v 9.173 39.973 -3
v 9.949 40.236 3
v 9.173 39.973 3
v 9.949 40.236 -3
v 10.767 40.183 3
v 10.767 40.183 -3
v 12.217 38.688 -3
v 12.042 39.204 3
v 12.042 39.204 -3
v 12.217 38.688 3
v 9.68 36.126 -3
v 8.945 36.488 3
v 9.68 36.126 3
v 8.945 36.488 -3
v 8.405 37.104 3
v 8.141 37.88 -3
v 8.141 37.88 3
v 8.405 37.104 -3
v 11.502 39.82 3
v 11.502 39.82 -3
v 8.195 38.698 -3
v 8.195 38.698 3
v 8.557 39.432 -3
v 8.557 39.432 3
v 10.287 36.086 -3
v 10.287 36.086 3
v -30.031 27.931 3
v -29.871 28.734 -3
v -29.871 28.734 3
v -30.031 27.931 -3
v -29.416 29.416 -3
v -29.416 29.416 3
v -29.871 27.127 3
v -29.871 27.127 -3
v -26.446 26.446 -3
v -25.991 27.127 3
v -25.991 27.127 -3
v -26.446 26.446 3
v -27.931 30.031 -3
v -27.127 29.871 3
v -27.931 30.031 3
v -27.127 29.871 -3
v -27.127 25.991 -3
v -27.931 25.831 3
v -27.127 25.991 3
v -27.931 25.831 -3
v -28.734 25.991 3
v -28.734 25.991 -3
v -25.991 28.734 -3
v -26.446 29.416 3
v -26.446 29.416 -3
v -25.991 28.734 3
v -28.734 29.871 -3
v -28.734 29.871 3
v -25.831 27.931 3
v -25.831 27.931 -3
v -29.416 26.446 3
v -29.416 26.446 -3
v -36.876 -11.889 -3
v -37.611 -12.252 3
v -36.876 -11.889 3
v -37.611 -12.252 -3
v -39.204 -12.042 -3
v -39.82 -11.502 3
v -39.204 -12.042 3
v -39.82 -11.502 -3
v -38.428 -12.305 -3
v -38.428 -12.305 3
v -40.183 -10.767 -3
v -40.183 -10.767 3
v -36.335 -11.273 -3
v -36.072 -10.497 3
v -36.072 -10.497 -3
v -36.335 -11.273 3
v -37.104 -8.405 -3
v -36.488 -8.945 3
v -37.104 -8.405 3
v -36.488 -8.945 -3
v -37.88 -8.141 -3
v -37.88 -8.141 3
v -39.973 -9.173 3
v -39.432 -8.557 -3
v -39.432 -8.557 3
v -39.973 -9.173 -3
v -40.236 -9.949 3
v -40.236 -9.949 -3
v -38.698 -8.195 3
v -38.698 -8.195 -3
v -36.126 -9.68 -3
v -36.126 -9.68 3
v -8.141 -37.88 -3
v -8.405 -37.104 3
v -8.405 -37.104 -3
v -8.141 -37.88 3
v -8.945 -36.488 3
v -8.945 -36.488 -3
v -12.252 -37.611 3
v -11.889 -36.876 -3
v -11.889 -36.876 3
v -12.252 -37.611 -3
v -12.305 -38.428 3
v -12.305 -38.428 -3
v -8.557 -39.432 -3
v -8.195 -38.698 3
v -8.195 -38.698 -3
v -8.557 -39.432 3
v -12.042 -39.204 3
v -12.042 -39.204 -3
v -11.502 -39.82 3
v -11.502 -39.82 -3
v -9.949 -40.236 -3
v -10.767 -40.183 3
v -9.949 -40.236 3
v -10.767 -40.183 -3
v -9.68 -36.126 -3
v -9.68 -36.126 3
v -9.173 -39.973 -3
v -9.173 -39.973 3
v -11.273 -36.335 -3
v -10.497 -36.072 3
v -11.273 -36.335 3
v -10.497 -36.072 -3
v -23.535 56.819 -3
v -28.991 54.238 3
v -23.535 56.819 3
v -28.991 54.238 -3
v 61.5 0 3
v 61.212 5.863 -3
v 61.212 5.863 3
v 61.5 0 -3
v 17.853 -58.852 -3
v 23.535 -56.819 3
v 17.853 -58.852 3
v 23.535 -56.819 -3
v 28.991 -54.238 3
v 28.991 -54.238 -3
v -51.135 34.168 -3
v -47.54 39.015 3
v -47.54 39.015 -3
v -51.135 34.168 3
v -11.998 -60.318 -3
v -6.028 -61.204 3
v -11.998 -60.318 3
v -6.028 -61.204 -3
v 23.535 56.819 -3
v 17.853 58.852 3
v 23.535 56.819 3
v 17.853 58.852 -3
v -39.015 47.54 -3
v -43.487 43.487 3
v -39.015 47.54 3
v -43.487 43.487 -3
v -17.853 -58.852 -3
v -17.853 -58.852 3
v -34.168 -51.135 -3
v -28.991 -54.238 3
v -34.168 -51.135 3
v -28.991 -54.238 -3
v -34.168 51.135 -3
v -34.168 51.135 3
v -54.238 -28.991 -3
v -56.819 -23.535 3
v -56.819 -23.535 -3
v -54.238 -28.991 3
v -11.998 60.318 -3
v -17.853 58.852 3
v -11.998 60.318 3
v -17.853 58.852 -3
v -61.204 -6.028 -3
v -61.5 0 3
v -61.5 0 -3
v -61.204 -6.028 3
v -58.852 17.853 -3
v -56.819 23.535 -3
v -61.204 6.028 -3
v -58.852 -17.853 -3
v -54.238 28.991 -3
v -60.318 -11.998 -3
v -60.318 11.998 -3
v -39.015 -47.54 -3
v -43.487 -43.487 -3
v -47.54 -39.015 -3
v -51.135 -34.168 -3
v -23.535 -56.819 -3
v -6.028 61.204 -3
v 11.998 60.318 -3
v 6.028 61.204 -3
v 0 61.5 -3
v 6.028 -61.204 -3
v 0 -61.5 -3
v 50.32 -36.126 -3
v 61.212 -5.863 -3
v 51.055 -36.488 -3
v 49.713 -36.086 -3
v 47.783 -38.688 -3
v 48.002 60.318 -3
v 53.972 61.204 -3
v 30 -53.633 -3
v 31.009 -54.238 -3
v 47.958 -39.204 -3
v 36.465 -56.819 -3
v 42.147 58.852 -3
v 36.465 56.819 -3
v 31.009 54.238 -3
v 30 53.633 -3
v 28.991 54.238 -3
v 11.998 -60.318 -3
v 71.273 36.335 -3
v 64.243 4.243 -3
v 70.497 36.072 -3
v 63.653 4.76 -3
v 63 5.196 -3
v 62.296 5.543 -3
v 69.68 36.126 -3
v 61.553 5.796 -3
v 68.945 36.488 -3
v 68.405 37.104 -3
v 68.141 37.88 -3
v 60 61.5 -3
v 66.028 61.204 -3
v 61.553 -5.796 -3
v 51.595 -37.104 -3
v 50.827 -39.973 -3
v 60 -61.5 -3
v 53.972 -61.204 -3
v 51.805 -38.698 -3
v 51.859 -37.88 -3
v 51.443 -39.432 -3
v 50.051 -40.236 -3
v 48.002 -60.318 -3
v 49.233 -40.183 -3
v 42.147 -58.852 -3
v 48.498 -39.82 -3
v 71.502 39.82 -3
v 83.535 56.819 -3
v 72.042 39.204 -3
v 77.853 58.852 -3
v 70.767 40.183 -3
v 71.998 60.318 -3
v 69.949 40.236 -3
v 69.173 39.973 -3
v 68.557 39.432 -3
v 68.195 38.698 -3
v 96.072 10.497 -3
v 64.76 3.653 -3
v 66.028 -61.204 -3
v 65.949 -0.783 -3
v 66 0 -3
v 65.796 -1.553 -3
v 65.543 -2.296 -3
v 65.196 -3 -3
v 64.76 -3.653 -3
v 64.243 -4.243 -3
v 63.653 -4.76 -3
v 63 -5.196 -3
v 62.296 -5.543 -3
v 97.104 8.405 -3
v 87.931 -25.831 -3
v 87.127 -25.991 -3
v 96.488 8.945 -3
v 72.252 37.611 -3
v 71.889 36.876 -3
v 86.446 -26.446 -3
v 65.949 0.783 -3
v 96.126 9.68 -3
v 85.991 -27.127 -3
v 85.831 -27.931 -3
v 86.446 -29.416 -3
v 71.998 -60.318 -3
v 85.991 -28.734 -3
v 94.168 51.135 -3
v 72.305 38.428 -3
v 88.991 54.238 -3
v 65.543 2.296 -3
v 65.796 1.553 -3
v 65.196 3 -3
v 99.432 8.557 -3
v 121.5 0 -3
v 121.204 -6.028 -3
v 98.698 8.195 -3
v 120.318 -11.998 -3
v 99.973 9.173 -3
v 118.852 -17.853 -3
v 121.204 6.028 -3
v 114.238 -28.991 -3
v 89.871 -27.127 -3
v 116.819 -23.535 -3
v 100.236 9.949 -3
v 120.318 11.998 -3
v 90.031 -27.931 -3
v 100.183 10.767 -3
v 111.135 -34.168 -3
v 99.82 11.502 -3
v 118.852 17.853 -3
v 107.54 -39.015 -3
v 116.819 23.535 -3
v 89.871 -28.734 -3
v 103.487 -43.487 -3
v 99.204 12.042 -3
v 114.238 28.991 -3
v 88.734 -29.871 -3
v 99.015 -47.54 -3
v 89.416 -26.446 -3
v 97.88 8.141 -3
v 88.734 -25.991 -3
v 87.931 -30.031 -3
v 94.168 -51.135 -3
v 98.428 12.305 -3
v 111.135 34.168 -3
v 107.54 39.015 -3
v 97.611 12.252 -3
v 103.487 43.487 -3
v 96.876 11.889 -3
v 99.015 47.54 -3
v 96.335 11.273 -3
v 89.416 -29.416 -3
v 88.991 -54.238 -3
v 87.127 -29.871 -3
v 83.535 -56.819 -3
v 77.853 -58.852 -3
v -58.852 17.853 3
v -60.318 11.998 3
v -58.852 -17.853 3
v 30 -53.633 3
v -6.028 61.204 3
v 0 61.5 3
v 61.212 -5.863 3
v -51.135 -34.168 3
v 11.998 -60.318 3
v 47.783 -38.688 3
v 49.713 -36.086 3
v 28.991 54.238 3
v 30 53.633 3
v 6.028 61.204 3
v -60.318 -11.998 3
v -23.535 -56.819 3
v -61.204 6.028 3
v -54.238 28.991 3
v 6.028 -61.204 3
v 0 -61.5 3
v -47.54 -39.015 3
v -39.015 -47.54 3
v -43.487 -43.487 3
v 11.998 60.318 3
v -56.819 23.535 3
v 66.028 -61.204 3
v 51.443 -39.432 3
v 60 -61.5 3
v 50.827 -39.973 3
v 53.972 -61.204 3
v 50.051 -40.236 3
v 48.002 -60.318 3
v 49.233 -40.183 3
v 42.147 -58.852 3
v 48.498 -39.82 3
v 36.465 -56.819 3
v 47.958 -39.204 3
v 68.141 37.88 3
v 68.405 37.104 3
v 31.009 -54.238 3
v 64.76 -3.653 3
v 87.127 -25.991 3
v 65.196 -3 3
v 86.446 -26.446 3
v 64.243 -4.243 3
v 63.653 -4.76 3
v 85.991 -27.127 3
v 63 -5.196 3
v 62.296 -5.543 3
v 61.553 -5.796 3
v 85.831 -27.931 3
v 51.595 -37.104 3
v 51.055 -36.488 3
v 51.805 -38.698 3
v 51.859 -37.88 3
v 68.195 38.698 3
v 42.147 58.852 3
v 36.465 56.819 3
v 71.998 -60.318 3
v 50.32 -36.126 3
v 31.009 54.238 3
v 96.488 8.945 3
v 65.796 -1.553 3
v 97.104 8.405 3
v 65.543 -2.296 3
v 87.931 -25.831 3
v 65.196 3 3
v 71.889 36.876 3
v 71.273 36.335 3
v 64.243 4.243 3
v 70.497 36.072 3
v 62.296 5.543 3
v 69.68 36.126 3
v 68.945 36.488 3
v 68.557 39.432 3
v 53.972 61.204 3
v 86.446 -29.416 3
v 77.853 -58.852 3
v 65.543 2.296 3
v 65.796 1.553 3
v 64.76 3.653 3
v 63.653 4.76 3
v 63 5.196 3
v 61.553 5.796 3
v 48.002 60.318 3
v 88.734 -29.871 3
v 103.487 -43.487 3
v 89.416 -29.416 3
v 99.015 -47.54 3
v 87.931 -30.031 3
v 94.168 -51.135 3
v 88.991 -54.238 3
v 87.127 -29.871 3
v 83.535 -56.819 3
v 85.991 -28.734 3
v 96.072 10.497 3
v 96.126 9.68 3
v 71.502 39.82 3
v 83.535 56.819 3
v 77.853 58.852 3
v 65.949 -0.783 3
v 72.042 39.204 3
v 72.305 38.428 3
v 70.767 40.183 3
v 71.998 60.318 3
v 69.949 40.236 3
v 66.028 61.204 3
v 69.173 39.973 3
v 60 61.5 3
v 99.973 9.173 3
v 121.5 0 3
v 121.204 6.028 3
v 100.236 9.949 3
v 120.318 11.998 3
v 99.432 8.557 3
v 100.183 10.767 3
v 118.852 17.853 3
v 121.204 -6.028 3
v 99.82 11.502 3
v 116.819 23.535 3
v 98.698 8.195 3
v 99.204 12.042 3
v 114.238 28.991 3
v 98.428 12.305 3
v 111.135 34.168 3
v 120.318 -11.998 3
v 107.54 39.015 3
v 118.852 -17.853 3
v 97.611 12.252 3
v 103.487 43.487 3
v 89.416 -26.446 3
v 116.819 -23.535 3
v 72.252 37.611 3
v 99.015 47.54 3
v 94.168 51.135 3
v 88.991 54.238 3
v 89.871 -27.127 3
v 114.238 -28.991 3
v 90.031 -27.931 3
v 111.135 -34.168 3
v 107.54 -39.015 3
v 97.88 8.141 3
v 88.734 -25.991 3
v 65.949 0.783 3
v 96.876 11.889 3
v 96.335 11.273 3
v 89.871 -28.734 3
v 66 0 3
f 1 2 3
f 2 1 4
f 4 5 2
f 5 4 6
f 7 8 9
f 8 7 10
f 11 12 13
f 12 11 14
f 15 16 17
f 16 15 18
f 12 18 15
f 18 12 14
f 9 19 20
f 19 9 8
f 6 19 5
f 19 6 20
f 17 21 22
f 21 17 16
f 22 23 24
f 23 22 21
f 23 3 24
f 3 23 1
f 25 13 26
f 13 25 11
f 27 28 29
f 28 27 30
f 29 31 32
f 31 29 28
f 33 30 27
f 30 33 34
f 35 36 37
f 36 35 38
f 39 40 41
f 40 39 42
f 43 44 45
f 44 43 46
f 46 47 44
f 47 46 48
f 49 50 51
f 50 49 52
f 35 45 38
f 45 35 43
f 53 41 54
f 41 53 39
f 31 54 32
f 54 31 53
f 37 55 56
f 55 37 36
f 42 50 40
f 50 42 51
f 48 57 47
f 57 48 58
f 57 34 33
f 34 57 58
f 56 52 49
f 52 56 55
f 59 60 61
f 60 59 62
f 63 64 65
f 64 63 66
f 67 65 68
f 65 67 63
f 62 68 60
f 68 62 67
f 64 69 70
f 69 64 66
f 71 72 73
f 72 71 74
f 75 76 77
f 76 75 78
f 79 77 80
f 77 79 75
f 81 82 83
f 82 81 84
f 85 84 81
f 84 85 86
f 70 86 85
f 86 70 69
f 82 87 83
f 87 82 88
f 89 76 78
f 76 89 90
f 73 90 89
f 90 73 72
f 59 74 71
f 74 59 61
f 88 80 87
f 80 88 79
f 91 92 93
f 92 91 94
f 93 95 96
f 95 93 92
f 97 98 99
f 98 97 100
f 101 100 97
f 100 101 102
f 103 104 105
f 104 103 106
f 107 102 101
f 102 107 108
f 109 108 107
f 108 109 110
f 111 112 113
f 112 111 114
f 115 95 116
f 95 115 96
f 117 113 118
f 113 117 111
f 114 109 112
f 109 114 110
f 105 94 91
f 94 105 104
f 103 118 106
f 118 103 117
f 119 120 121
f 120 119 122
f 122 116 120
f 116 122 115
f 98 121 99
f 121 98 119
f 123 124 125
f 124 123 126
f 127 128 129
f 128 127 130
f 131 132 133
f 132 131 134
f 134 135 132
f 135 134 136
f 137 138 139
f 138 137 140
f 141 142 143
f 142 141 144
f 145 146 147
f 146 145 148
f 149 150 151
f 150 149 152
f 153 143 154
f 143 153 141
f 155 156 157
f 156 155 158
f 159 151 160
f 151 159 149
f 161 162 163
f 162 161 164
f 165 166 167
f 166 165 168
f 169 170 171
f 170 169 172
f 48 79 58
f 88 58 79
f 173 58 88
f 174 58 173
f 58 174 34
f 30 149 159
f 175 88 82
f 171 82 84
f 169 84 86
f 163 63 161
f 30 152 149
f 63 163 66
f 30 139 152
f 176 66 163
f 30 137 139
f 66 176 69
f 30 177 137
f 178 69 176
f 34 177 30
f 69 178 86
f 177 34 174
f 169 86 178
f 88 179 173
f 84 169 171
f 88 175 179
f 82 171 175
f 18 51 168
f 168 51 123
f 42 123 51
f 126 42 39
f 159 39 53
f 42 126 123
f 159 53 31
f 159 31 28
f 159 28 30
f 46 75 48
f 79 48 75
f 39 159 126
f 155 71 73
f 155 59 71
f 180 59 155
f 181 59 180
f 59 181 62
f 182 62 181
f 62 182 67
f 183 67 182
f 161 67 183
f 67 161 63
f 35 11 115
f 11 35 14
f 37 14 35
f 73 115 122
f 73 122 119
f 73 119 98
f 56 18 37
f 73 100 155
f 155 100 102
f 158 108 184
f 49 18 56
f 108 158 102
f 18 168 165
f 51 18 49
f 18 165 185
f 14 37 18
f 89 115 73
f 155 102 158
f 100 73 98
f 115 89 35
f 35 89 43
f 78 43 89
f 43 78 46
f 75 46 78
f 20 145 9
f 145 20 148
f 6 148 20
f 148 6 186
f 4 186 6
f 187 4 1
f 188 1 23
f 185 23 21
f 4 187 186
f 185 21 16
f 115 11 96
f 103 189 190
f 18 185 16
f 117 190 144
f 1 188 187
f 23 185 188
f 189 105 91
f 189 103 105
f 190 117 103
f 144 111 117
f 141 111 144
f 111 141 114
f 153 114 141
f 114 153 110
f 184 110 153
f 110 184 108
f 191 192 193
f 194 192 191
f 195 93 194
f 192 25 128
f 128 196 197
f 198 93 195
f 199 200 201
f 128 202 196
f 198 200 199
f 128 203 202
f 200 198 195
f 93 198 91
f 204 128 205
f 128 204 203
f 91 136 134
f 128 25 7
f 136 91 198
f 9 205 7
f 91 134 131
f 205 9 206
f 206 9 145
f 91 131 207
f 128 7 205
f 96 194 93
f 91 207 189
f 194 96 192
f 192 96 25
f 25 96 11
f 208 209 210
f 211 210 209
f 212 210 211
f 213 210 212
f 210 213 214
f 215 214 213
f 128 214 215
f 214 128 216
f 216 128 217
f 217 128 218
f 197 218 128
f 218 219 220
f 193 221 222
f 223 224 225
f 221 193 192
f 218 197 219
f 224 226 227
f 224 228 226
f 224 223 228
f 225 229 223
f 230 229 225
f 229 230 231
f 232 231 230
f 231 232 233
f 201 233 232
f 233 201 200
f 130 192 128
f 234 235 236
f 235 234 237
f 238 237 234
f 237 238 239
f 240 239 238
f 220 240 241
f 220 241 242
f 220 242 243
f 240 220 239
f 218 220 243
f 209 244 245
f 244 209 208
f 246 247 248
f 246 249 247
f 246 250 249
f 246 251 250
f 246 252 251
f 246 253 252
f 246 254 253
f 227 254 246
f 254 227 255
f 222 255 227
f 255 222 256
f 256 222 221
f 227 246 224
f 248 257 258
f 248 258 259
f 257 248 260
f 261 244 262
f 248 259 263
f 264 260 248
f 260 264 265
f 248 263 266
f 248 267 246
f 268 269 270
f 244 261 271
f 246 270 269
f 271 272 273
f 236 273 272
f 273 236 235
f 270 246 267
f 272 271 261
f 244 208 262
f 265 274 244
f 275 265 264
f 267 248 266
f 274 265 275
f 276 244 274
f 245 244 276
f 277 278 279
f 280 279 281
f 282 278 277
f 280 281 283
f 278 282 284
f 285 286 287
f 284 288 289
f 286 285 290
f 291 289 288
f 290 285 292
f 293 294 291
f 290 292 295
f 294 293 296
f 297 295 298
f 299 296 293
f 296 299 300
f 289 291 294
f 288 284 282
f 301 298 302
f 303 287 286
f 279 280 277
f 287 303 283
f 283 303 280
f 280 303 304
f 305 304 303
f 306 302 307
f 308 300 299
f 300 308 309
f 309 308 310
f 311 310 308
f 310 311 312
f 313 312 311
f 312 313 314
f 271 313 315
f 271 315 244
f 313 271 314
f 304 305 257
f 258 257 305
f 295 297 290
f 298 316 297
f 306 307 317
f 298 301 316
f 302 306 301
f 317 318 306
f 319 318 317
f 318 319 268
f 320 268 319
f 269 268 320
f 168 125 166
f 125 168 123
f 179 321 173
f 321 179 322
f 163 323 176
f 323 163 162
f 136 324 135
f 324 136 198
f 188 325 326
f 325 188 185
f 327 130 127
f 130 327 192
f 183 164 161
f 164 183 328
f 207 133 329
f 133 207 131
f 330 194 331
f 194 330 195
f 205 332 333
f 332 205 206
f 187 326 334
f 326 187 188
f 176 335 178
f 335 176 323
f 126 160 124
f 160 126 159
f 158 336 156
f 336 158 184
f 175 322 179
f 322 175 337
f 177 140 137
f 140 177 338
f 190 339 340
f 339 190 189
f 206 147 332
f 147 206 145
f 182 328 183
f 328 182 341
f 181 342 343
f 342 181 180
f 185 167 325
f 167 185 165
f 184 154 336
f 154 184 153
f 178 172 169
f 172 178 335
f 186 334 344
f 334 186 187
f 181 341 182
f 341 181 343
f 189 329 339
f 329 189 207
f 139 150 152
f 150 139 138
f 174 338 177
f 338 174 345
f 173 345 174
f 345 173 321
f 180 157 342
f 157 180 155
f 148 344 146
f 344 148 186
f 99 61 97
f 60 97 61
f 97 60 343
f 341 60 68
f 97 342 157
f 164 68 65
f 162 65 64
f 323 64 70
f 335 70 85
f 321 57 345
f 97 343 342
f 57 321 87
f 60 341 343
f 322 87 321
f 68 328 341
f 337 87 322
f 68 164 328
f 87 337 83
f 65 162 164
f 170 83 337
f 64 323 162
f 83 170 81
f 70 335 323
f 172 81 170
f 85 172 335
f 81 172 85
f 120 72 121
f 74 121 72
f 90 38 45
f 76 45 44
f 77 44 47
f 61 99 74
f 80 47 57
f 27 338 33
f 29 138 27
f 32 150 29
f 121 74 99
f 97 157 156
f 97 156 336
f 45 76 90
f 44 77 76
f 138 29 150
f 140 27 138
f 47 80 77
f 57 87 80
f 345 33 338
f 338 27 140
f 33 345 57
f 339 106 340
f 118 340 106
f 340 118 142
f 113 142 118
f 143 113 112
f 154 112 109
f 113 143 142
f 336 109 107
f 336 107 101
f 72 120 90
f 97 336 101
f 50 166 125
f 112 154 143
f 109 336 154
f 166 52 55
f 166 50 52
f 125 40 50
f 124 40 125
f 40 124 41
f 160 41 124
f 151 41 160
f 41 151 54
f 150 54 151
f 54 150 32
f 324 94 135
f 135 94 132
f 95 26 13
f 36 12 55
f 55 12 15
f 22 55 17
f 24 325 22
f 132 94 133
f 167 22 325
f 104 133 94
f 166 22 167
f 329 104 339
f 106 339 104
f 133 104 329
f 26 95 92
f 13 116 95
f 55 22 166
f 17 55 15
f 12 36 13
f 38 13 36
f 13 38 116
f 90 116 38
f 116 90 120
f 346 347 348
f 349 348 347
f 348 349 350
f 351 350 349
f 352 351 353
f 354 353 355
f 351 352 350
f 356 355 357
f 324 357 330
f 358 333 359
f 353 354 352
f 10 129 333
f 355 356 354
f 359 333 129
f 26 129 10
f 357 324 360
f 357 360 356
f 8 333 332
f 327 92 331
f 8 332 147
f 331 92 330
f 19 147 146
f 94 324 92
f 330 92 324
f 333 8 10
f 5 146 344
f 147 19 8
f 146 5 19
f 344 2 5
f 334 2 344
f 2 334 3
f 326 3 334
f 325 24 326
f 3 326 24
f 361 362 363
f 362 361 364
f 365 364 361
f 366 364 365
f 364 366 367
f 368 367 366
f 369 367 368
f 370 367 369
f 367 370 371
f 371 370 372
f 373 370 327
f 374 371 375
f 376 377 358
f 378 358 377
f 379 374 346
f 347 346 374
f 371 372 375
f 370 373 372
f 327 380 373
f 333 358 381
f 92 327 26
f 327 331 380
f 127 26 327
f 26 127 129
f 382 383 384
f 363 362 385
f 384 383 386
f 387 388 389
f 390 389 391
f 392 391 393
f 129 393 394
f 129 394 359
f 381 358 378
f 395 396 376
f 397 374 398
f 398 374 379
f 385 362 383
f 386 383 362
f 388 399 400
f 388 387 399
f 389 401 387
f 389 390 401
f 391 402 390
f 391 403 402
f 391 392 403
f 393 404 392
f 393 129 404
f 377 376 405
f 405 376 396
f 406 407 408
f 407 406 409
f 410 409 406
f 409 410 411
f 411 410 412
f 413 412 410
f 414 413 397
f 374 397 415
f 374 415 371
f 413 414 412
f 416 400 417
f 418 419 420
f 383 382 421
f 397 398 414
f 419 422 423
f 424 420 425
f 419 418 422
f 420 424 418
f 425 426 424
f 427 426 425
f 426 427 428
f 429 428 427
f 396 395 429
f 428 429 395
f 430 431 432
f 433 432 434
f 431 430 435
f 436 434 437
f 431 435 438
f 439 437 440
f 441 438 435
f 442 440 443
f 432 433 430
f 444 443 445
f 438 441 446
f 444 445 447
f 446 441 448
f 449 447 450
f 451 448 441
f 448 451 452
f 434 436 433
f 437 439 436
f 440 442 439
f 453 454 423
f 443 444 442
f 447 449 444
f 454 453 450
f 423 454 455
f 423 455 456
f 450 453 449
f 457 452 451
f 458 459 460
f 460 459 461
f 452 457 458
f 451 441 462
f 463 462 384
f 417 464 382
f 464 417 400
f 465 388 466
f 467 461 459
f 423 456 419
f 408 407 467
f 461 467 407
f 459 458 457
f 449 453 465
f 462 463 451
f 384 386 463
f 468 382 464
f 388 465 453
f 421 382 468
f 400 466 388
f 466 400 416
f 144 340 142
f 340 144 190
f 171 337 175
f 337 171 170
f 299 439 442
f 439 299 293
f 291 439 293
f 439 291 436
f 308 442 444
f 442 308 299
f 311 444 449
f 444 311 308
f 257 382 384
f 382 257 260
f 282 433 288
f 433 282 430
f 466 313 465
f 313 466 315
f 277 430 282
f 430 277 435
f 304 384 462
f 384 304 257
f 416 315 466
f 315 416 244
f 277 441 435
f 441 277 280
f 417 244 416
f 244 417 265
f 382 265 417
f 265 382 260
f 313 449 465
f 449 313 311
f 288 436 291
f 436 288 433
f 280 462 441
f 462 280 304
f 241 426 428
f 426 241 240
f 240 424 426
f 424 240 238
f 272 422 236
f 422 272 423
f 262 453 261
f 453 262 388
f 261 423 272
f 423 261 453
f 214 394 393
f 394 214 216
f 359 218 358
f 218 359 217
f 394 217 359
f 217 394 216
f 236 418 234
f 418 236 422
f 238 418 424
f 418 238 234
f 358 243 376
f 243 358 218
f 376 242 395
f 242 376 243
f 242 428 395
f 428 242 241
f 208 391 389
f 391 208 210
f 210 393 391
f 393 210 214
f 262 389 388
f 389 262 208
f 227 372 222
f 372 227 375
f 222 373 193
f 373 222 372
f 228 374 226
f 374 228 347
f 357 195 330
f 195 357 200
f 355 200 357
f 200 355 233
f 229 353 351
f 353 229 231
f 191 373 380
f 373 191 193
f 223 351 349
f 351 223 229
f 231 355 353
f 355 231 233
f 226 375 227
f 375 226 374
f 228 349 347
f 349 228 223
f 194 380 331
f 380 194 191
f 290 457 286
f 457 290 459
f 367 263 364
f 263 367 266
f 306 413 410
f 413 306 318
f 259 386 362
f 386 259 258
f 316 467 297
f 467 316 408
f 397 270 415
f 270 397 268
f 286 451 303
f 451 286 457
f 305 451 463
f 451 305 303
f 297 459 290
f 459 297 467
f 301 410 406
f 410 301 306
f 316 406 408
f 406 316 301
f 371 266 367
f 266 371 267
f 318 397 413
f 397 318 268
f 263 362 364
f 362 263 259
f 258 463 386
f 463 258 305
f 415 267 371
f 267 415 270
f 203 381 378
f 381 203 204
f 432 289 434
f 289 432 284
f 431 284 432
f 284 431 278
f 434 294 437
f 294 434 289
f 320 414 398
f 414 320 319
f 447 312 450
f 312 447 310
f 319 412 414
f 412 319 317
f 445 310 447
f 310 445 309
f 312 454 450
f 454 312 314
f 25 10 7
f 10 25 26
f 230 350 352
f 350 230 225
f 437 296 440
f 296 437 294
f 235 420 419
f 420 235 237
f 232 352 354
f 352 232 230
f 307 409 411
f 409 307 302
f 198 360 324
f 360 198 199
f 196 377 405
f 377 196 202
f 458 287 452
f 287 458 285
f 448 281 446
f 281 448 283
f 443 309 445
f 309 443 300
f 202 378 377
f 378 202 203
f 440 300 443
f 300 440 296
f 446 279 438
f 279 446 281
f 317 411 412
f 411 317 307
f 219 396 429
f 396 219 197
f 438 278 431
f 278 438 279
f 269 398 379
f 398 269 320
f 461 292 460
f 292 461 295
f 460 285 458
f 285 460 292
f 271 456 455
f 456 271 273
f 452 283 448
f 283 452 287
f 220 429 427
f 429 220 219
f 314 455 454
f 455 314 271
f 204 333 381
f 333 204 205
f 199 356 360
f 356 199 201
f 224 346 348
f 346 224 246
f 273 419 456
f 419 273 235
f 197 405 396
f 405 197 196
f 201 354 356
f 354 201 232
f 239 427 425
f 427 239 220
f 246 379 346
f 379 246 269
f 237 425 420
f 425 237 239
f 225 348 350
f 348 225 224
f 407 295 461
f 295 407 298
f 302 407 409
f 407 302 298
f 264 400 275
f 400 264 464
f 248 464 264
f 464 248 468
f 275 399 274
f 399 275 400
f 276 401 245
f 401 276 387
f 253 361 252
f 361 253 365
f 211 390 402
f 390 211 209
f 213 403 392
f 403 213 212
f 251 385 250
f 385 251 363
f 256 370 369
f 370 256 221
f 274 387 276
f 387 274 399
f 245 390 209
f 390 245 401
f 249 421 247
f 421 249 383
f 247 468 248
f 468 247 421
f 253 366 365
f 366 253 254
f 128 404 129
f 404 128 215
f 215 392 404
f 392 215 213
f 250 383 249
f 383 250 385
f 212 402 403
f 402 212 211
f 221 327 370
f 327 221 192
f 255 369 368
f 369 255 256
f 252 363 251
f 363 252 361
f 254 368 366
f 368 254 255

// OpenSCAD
/*
 * OPERATION_COVERS.scad
 * Solid top and bottom covers (alternative to clear viewport).
 * Top cover can have central jet orifice when used without HVAT.
 * From the May 2026 Grok design conversation.
 */

module operation_cover(has_central_orifice=false, orifice_d=12) {
    difference() {
        cylinder(d=95 + 28, h=6, center=true, $fn=64);
        if (has_central_orifice) {
            cylinder(d=orifice_d, h=8, center=true, $fn=48);
        }
        // Bolt pattern
        for (i = [0:5]) {
            rotate([0,0,i*60 + 15])
                translate([95/2 - 8, 0, 0])
                    cylinder(d=4.2, h=8, center=true, $fn=16);
        }
    }
}

// Top solid cover (no orifice)
operation_cover(has_central_orifice=false);

// Bottom jet cover (with orifice for direct chamber connection)
translate([60,0,0]) operation_cover(has_central_orifice=true, orifice_d=12);
